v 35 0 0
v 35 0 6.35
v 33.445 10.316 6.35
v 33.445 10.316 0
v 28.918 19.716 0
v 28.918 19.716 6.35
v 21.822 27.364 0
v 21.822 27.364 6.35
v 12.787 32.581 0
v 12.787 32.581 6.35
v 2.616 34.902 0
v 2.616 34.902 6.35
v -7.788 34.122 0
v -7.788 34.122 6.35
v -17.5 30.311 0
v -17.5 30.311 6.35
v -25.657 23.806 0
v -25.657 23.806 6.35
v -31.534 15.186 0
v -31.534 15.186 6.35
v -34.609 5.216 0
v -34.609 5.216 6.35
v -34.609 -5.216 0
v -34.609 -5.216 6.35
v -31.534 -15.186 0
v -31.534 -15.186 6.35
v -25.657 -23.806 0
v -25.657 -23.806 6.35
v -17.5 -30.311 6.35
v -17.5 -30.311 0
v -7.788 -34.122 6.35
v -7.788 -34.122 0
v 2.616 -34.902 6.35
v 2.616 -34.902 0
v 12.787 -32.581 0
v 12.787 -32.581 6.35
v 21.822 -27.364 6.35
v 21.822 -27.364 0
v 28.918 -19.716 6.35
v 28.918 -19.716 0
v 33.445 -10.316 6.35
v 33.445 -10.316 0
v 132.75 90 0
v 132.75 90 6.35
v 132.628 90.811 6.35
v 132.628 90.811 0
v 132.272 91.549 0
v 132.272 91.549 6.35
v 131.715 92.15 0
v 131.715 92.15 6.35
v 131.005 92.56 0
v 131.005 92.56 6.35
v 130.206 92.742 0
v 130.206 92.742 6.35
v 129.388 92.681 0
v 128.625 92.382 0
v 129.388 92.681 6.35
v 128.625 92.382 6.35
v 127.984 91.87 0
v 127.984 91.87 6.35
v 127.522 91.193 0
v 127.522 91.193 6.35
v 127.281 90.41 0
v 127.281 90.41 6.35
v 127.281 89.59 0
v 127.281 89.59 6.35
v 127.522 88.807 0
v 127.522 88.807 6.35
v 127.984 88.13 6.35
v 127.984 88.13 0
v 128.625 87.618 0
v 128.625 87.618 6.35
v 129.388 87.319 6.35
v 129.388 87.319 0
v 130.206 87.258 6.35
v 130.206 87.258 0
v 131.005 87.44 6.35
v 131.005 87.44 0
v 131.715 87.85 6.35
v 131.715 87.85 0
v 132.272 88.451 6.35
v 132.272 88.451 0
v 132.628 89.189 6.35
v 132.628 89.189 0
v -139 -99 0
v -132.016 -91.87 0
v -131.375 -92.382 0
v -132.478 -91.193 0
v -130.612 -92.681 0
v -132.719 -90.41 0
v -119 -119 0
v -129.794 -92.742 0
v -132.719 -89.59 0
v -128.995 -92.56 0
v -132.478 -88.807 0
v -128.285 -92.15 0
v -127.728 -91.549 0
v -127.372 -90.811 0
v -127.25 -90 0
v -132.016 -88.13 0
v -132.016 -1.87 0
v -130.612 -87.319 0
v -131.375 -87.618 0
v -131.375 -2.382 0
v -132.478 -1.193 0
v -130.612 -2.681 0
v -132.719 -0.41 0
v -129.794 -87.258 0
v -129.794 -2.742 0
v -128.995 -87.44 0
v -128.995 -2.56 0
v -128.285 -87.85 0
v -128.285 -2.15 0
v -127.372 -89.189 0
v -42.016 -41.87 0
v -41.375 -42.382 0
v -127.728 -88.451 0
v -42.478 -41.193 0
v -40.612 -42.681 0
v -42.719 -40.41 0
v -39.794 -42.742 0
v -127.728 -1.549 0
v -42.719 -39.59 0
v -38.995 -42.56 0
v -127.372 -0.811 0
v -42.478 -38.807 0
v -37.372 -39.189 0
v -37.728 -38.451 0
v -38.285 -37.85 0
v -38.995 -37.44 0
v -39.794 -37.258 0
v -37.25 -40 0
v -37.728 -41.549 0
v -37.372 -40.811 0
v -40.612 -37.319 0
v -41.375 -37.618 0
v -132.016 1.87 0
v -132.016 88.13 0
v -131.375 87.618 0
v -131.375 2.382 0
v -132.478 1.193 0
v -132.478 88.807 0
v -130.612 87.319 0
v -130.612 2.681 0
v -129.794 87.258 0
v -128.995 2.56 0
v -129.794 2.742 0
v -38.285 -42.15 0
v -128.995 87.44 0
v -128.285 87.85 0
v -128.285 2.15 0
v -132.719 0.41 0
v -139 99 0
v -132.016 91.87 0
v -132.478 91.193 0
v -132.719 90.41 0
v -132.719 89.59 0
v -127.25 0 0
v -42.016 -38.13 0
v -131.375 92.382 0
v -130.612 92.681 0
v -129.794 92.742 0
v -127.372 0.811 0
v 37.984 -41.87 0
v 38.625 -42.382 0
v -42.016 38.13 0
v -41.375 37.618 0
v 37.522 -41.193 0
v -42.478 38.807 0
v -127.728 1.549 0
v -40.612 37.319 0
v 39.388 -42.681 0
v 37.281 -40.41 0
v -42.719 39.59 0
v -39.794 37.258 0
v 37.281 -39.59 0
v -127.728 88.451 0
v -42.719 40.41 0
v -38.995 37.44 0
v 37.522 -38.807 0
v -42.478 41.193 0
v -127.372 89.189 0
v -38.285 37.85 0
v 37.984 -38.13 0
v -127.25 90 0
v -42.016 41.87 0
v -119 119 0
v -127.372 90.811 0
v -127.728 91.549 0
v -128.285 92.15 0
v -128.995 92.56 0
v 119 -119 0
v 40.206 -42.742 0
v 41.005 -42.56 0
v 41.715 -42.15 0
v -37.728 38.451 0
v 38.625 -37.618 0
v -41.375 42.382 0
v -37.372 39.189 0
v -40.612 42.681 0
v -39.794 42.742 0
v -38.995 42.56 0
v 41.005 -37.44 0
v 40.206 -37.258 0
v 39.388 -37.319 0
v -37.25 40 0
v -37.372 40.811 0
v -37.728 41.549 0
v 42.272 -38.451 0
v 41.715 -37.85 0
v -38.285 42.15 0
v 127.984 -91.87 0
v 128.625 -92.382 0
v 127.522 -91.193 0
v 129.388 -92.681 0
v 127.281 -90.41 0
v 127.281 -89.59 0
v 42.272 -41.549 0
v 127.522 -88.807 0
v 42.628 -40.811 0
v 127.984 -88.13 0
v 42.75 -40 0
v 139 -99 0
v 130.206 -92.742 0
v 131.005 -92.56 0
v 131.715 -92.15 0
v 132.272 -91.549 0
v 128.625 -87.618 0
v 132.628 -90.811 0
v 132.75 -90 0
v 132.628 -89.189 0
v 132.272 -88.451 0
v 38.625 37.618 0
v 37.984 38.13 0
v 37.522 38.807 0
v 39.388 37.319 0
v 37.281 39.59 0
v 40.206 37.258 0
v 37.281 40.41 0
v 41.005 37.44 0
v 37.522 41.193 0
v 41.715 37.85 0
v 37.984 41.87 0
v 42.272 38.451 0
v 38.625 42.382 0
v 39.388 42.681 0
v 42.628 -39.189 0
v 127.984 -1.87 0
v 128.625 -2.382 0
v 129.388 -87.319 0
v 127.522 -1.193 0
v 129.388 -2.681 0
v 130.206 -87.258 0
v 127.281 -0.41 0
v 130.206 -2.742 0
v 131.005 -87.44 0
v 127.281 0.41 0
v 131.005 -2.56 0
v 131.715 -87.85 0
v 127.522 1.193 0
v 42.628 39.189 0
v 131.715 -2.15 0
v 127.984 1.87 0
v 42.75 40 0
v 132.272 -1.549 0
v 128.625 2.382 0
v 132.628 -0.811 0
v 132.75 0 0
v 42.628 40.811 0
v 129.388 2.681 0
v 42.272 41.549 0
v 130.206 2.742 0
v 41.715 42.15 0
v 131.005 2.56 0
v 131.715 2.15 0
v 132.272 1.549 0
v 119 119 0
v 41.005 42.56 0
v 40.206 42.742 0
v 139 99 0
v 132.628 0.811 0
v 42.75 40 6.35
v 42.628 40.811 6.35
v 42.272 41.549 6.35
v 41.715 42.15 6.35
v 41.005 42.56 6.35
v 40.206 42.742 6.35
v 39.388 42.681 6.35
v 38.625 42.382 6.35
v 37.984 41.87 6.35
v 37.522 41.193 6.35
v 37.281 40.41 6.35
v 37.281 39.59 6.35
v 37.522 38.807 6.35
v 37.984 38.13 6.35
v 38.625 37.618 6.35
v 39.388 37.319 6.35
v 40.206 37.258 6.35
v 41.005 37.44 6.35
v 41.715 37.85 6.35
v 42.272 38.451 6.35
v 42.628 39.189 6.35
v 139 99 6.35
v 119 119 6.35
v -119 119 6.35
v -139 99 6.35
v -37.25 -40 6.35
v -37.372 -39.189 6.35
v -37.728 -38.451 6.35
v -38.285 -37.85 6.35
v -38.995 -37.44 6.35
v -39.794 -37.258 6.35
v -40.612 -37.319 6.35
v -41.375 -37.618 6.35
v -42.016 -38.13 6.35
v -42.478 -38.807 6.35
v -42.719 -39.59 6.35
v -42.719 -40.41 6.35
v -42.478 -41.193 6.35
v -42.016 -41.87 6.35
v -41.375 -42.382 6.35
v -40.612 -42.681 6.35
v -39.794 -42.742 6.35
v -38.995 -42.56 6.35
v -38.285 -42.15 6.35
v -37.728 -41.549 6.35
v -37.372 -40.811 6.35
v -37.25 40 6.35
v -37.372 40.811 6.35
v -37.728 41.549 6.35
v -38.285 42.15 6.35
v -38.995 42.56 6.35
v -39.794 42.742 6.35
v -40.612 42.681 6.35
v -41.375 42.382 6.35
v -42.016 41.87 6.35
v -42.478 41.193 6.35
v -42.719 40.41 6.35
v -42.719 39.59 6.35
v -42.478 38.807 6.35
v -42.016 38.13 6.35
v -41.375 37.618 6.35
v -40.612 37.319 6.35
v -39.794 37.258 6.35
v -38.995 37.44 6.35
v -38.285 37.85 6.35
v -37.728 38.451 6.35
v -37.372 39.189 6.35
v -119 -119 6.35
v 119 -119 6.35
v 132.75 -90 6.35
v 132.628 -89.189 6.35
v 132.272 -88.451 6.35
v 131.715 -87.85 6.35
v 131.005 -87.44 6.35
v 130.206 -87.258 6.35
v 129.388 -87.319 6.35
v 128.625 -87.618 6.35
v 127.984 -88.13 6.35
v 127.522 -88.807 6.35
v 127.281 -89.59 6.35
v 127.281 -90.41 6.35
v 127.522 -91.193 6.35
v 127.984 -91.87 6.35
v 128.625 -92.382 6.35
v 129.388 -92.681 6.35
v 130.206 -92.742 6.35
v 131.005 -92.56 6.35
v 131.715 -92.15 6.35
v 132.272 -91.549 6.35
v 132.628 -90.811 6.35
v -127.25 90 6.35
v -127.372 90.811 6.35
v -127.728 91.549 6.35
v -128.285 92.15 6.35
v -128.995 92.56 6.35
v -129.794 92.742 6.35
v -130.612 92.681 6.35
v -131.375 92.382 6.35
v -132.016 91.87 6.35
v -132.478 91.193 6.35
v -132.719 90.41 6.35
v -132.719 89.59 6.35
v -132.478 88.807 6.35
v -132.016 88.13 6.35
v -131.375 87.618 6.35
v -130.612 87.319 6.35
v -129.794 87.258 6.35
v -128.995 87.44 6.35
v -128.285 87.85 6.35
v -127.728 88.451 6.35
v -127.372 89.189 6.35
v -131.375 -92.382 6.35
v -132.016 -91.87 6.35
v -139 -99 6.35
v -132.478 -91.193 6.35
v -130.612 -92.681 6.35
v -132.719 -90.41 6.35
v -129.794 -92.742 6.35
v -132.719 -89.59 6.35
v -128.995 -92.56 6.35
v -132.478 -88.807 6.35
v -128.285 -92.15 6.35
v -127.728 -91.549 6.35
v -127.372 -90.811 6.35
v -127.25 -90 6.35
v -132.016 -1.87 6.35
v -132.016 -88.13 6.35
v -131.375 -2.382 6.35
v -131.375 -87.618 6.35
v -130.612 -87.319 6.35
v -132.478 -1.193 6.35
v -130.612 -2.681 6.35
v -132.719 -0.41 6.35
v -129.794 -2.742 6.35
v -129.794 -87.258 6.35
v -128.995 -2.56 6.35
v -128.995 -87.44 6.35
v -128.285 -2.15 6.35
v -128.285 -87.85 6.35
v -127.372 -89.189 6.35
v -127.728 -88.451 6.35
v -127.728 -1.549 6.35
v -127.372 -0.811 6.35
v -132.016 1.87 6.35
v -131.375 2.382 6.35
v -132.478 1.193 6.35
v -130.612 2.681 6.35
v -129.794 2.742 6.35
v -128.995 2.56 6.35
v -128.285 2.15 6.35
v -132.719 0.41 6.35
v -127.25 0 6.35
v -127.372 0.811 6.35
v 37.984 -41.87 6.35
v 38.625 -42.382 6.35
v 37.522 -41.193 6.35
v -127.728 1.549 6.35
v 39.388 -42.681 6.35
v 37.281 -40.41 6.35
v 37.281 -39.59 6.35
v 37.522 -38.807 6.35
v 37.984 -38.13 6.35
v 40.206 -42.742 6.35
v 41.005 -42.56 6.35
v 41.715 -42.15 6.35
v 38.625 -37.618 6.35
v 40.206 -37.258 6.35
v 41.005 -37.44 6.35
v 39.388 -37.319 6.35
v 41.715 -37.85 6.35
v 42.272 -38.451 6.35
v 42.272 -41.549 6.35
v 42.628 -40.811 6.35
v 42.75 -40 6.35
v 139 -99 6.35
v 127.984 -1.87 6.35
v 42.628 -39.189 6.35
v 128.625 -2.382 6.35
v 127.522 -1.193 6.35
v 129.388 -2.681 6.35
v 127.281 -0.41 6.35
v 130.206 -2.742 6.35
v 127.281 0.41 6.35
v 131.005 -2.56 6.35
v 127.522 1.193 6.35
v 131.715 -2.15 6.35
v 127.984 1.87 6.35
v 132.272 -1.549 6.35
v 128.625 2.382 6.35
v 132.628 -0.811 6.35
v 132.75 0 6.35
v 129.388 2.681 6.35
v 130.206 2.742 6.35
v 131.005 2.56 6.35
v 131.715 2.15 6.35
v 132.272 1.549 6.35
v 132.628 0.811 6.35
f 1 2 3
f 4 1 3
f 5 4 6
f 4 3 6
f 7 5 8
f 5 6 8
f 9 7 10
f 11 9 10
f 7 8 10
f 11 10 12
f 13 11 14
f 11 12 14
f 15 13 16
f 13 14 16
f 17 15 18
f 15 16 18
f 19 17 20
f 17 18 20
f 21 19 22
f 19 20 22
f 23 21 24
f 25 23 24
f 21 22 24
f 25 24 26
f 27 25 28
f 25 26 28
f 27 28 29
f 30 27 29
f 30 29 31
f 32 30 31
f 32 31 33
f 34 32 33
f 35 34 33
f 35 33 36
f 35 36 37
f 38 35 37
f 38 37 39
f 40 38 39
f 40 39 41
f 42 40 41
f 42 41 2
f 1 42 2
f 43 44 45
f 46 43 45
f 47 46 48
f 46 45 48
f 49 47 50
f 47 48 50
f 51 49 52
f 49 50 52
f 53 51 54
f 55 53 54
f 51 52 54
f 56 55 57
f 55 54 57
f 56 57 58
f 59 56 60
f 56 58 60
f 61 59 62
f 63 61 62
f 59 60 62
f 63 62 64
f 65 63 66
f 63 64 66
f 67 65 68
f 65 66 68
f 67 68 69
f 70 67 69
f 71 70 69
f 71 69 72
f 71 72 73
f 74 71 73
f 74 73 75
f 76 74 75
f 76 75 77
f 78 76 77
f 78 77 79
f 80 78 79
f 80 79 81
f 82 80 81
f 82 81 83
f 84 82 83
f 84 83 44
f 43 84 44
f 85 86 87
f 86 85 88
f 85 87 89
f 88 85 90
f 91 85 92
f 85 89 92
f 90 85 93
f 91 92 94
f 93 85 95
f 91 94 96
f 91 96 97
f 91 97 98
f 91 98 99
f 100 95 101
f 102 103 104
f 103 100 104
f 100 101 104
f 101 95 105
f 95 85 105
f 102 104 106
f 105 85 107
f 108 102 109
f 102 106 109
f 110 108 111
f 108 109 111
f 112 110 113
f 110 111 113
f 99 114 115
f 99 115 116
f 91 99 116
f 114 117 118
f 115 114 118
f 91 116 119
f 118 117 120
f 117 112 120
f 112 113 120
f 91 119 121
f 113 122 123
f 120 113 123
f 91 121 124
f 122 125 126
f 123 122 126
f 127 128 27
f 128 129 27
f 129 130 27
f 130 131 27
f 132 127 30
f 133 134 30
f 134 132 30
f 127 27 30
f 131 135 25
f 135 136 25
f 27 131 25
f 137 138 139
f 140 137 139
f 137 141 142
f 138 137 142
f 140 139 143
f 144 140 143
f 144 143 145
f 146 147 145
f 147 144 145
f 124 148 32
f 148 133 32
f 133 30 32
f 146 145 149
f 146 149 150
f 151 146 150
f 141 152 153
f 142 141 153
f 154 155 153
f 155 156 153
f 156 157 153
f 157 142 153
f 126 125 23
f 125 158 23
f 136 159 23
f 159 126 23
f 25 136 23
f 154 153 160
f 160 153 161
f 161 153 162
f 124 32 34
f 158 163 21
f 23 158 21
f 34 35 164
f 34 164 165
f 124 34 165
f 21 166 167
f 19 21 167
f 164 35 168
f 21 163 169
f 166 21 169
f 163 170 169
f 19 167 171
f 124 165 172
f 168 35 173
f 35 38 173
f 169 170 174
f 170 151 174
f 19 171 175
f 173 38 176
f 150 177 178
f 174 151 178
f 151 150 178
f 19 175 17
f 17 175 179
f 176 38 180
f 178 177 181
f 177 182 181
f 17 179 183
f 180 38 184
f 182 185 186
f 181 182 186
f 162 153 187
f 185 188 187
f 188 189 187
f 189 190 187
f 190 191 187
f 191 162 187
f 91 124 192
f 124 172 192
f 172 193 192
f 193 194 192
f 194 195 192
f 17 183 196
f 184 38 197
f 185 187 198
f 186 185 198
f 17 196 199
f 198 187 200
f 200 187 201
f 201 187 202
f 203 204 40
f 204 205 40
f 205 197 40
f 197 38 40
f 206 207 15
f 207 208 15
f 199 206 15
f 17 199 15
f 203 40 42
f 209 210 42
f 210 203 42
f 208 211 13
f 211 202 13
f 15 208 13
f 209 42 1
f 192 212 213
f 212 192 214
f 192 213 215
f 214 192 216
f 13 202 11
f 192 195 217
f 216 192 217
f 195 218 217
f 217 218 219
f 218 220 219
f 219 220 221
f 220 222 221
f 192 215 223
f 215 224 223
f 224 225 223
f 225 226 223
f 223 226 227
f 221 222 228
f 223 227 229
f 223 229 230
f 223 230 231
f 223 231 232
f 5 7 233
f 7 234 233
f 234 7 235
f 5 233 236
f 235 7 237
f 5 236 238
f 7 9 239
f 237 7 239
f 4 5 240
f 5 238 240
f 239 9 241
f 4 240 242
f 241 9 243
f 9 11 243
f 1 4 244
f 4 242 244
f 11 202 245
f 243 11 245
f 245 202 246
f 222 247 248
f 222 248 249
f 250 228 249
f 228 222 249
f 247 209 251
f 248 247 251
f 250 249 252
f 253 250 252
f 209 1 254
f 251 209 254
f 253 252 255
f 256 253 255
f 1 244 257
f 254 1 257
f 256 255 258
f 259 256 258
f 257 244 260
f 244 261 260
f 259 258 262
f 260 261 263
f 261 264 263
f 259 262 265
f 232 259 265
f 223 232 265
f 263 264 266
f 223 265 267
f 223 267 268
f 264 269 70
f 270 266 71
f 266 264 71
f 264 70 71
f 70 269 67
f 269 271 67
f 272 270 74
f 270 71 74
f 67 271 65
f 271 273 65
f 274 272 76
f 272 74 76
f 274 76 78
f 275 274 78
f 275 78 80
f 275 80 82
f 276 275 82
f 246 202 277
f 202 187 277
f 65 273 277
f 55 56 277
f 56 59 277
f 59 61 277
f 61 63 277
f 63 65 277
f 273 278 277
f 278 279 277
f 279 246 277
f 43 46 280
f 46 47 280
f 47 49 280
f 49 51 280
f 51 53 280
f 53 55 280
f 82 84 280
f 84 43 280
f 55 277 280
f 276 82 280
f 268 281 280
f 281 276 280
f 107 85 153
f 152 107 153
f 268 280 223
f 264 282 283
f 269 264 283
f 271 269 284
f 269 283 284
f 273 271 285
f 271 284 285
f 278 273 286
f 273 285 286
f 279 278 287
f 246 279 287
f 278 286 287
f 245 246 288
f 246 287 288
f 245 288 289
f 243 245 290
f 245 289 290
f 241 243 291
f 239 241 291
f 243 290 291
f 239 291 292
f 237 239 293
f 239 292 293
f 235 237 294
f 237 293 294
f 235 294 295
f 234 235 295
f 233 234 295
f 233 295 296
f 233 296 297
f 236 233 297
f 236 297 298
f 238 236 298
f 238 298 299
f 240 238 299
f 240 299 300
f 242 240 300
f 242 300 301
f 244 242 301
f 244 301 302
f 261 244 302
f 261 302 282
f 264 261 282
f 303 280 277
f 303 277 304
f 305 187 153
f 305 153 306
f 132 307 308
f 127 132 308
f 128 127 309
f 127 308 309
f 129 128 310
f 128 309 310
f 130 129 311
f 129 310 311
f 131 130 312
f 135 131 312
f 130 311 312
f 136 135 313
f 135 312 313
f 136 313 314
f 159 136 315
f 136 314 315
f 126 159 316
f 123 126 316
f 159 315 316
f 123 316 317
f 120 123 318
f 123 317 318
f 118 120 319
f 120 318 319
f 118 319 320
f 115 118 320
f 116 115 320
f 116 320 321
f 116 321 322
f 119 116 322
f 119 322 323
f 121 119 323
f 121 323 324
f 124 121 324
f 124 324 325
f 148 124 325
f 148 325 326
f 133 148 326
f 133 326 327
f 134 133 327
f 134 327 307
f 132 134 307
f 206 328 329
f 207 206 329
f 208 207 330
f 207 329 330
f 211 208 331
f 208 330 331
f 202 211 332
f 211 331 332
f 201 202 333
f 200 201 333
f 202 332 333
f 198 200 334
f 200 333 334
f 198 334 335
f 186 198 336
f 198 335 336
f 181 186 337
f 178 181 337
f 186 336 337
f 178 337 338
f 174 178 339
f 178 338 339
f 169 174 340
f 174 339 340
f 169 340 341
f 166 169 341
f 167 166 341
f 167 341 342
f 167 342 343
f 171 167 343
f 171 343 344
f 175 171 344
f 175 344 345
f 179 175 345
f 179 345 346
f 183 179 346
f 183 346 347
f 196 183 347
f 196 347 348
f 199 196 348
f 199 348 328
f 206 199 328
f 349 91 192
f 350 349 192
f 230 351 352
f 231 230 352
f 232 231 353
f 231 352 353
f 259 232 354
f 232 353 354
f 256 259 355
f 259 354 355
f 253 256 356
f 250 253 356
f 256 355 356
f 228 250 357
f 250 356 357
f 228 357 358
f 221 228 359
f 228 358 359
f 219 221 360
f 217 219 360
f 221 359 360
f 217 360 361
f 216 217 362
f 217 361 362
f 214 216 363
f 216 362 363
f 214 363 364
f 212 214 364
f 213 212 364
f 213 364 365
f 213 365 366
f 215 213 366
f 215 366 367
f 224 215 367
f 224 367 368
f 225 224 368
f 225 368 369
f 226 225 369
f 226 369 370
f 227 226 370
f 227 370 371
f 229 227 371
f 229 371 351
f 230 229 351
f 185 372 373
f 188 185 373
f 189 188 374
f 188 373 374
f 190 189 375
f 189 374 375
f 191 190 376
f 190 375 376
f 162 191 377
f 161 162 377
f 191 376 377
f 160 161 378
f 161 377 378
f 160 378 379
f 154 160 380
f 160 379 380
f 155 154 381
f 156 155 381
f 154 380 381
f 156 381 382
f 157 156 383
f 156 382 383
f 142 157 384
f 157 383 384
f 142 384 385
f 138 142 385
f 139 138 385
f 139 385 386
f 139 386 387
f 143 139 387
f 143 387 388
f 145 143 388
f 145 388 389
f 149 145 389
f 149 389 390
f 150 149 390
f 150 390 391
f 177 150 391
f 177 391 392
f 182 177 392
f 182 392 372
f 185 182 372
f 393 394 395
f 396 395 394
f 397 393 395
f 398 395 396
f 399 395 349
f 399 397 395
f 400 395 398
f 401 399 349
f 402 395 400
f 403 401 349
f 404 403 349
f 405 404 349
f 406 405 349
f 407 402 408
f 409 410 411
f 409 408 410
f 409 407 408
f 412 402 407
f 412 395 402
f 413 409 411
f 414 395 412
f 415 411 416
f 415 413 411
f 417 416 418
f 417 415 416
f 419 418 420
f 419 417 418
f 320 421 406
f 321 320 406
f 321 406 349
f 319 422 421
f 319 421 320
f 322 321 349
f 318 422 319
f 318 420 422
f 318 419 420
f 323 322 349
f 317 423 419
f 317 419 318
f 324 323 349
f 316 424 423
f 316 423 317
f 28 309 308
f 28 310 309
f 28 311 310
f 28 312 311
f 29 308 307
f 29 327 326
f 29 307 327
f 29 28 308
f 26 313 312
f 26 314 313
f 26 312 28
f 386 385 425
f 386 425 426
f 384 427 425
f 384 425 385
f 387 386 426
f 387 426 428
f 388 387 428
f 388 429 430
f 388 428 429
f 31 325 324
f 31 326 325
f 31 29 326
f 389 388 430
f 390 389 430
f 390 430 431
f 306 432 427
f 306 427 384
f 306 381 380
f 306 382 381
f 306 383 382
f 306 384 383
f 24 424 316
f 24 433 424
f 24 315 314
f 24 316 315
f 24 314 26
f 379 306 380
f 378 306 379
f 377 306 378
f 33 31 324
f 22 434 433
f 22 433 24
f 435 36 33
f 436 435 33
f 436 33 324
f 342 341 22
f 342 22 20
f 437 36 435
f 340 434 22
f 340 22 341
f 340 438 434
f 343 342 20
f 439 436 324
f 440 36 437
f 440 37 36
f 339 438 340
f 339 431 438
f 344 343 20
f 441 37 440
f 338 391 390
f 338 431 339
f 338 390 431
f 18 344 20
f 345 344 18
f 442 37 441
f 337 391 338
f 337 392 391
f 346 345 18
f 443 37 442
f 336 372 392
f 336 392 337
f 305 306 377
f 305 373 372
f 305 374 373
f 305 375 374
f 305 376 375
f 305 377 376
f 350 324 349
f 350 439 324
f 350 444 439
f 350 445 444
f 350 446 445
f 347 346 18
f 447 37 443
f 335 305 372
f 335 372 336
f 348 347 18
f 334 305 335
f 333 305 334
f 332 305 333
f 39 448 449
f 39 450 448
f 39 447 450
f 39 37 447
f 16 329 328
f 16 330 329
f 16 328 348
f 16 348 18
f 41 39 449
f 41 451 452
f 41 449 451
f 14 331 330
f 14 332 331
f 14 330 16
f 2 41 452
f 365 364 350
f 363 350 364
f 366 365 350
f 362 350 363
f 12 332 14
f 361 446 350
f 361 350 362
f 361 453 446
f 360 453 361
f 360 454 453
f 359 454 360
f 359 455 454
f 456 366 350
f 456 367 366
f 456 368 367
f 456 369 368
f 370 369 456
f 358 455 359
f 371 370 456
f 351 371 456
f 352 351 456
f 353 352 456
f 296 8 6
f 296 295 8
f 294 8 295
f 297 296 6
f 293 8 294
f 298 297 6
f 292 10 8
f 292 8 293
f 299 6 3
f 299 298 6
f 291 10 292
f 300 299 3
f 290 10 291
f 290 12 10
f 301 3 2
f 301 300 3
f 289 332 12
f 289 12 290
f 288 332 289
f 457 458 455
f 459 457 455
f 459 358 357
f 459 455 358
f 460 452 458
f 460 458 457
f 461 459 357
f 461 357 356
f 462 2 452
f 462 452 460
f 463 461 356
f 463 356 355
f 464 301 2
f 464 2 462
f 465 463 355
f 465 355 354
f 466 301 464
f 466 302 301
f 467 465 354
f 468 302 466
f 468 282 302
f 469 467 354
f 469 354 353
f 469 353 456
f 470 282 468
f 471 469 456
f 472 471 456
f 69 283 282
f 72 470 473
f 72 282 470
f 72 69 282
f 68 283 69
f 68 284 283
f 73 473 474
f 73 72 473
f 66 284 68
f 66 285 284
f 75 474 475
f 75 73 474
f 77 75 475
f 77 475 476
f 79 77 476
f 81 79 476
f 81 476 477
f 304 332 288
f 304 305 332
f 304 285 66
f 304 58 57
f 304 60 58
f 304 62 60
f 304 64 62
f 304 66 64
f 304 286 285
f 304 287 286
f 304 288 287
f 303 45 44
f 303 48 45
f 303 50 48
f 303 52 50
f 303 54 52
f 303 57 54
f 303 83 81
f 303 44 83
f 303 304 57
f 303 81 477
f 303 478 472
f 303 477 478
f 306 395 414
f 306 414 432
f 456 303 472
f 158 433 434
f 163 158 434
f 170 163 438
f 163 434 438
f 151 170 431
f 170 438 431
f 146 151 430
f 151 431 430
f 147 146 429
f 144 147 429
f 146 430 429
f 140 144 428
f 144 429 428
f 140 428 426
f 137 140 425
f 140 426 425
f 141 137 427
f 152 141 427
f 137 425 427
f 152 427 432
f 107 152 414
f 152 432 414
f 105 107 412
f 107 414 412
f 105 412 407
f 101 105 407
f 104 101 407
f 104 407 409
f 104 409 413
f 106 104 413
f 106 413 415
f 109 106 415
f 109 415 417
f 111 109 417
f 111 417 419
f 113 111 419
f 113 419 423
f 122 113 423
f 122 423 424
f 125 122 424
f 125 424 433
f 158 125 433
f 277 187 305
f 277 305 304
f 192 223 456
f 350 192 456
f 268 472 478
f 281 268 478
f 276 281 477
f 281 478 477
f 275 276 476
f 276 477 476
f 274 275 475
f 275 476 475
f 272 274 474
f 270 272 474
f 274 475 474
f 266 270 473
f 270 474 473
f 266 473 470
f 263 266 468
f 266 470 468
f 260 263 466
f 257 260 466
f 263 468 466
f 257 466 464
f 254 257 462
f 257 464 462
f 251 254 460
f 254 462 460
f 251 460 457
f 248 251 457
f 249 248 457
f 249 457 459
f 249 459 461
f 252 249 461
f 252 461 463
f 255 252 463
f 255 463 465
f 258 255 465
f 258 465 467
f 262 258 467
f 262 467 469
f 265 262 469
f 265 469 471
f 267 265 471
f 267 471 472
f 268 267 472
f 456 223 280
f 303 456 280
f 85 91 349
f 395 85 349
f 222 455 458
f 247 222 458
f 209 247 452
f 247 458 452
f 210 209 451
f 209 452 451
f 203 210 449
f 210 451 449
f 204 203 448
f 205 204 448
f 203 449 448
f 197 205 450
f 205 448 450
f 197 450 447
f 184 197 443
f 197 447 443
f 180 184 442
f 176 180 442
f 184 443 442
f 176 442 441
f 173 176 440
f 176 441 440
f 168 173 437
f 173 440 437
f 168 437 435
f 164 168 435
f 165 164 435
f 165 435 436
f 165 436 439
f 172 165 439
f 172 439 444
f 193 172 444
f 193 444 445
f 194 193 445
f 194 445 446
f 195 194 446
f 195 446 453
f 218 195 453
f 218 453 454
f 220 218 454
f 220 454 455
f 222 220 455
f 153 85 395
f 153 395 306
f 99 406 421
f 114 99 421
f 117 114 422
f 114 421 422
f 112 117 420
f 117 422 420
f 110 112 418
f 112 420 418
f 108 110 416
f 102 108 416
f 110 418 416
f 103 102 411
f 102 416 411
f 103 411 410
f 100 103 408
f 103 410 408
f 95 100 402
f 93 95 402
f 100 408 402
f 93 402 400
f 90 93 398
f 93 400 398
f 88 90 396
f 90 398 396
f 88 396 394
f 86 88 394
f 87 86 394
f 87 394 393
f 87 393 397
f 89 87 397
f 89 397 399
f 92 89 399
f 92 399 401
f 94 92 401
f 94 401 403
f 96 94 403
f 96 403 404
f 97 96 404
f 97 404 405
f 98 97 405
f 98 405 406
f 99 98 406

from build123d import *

# Parameters (mm, degrees)
SKETCH1_W           = 278
SKETCH1_H           = 238
BOSS_EXTRUDE1_DEPTH = 6.35
SKETCH2_R           = 35
SKETCH2_R_2         = 2.75
CUT_EXTRUDE1_DEPTH  = 7.35
CHAMFER1_SIZE       = 20
SKETCH4_R           = 2.75
CUT_EXTRUDE2_DEPTH  = 76.2


with BuildPart() as part:
    # Sketch1 → Boss-Extrude1 (new body)
    with BuildSketch(Plane.XY):
        Rectangle(SKETCH1_W, SKETCH1_H)
    extrude(amount=BOSS_EXTRUDE1_DEPTH)

    # Sketch2 → Cut-Extrude1 (cut, through all)
    with BuildSketch(Plane.XY.offset(6.35)):
        Circle(SKETCH2_R)
        with Locations((-40, 40)):
            Circle(SKETCH2_R_2)
        with Locations((40, 40)):
            Circle(SKETCH2_R_2)
        with Locations((40, -40)):
            Circle(SKETCH2_R_2)
        with Locations((-40, -40)):
            Circle(SKETCH2_R_2)
    extrude(amount=-CUT_EXTRUDE1_DEPTH, mode=Mode.SUBTRACT)

    # Chamfer1
    chamfer1_edges = [part.edges().sort_by_distance(p)[0] for p in [
        (-139, 119, 3.175),
        (139, 119, 3.175),
        (139, -119, 3.175),
        (-139, -119, 3.175),
    ]]
    chamfer(chamfer1_edges, length=CHAMFER1_SIZE)

    # Sketch4 → Cut-Extrude2 (cut)
    with BuildSketch(Plane.XY.offset(6.35)):
        with Locations((-130, 90)):
            Circle(SKETCH4_R)
        with Locations((130, 90)):
            Circle(SKETCH4_R)
        with Locations((-130, -90)):
            Circle(SKETCH4_R)
        with Locations((130, -90)):
            Circle(SKETCH4_R)
        with Locations((-130, 0)):
            Circle(SKETCH4_R)
        with Locations((130, 0)):
            Circle(SKETCH4_R)
    extrude(amount=-CUT_EXTRUDE2_DEPTH, mode=Mode.SUBTRACT)


solid = part.part
